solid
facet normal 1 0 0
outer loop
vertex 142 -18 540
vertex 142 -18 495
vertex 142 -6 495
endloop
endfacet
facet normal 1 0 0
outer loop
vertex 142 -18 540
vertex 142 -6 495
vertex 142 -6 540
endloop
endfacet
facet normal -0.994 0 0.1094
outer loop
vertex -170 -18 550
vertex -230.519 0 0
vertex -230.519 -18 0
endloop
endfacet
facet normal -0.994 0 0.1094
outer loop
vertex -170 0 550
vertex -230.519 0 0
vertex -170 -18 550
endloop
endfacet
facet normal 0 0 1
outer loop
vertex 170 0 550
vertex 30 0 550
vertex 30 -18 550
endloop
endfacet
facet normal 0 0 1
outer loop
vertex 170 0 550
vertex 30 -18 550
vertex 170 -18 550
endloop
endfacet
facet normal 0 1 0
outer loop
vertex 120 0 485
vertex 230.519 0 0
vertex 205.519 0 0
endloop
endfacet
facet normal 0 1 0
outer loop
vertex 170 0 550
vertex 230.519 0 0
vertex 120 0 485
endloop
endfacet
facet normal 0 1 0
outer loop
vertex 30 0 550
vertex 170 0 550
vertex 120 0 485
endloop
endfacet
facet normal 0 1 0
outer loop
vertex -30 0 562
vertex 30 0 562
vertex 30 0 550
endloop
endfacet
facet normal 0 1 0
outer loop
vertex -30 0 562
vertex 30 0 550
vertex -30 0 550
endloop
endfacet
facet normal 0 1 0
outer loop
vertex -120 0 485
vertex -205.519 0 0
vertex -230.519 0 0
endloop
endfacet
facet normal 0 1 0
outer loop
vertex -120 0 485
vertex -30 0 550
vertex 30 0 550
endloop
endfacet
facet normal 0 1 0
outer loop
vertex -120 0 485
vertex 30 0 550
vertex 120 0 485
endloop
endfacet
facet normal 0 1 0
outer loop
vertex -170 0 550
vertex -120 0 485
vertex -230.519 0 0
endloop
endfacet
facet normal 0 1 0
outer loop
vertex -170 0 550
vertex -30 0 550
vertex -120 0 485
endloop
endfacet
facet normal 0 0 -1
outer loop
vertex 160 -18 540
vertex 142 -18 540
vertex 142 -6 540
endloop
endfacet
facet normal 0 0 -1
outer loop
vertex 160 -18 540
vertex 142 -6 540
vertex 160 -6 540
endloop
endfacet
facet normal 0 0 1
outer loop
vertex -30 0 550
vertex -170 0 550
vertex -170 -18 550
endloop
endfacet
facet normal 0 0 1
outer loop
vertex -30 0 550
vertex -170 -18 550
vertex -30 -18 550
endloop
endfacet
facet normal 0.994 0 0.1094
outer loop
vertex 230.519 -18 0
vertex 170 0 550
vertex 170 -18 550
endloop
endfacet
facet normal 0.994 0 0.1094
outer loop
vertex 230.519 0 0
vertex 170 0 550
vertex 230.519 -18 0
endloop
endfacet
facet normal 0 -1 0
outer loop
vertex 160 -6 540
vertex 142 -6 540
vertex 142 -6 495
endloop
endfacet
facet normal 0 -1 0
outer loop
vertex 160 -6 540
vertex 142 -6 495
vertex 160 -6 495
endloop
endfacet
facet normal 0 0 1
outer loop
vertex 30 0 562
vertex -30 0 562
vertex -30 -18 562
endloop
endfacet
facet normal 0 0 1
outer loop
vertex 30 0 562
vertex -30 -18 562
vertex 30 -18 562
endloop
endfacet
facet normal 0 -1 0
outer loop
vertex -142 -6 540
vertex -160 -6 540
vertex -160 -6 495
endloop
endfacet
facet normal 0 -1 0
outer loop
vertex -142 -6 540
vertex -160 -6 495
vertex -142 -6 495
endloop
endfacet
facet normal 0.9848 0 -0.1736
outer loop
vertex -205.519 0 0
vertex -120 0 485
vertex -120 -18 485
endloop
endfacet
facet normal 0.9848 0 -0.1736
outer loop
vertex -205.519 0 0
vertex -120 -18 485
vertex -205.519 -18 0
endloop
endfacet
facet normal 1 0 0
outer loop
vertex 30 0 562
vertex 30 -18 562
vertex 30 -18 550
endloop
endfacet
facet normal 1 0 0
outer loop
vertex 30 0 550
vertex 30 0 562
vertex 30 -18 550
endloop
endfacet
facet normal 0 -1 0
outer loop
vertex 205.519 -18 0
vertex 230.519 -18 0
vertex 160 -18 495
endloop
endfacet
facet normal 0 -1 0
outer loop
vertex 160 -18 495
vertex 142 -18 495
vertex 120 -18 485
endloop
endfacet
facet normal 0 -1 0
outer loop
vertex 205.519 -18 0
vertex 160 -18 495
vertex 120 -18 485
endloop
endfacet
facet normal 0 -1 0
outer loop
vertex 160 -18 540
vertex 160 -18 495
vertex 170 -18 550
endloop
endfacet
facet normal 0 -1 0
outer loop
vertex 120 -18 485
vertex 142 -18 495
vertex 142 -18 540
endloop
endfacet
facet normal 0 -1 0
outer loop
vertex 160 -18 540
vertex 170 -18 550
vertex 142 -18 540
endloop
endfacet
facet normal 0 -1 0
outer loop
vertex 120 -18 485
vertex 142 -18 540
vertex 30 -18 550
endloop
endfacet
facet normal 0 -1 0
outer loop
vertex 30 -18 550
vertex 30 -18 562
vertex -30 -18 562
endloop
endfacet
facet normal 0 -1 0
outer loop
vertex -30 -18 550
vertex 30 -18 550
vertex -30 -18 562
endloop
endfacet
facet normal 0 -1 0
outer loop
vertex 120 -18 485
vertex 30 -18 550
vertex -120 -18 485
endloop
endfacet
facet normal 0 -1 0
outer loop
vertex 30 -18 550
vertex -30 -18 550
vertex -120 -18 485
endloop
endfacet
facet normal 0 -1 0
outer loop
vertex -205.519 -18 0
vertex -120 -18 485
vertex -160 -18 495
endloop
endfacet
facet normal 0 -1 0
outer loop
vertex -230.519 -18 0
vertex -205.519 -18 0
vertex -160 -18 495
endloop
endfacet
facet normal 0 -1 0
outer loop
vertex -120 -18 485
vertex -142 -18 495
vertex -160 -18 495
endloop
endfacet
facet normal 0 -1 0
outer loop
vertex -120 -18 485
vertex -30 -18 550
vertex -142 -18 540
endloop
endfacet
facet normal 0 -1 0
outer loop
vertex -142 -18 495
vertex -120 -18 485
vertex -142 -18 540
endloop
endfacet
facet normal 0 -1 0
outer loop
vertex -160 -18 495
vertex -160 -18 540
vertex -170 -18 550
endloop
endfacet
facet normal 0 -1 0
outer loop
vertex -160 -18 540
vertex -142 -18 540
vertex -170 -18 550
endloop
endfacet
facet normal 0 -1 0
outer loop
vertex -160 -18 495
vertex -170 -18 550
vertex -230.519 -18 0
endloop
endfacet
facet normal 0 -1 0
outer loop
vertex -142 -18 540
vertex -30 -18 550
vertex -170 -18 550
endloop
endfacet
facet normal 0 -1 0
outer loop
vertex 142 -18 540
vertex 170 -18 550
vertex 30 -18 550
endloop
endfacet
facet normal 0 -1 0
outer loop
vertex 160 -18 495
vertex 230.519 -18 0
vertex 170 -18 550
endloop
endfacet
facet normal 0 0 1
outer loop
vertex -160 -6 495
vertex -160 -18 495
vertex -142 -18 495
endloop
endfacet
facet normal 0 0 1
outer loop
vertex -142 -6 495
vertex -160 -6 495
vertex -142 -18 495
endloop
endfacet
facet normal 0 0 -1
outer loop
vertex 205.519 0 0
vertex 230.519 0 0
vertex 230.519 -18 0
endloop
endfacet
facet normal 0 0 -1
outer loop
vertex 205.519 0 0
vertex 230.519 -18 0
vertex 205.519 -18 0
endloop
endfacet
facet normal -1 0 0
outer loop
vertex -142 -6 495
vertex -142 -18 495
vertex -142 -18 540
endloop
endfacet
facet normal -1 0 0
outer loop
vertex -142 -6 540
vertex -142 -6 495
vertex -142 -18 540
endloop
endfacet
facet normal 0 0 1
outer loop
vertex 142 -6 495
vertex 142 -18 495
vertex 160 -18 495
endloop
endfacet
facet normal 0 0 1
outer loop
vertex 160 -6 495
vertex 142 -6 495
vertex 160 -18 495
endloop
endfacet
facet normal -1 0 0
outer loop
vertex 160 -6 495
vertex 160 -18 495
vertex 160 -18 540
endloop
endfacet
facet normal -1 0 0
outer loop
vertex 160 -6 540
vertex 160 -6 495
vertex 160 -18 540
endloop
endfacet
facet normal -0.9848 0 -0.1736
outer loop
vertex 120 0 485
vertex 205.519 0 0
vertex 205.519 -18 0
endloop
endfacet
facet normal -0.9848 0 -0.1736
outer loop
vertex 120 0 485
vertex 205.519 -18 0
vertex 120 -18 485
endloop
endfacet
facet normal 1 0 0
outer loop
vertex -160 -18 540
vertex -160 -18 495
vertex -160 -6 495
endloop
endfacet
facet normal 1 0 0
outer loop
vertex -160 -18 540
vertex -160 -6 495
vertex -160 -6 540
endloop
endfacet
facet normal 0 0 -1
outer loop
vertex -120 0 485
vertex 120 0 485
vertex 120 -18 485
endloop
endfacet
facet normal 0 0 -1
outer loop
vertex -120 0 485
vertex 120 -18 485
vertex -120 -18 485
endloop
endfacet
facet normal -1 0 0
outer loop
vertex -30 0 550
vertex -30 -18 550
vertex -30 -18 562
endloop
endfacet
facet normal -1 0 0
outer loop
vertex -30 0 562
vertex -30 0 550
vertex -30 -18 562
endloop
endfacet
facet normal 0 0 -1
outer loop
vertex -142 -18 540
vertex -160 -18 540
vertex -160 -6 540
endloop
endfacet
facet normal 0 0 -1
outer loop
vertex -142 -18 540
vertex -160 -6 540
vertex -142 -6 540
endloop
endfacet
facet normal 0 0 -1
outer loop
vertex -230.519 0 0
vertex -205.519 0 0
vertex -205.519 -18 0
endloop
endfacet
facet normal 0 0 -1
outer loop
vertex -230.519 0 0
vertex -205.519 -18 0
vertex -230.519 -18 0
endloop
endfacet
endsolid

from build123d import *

# Parameters (mm, degrees)
PAD_DEPTH    = 18
SKETCH001_W  = 18
SKETCH001_H  = 45
POCKET_DEPTH = 12


with BuildPart() as part:
    # Sketch → Pad (new body)
    with BuildSketch(Plane.XZ):
        Polygon((-230.518586, 0), (-170, 550), (-30, 550), (-30, 562), (30, 562), (30, 550), (170, 550), (230.518586, 0), (205.518586, 0), (120, 485), (-120, 485), (-205.518586, 0), align=None)
    extrude(amount=PAD_DEPTH)

    # Sketch001 → Pocket (cut)
    with BuildSketch(Plane.XZ.offset(18)):
        with Locations((-151, 517.5)):
            Rectangle(SKETCH001_W, SKETCH001_H)
        with Locations((151, 517.5)):
            Rectangle(SKETCH001_W, SKETCH001_H)
    extrude(amount=-POCKET_DEPTH, mode=Mode.SUBTRACT)


solid = part.part
